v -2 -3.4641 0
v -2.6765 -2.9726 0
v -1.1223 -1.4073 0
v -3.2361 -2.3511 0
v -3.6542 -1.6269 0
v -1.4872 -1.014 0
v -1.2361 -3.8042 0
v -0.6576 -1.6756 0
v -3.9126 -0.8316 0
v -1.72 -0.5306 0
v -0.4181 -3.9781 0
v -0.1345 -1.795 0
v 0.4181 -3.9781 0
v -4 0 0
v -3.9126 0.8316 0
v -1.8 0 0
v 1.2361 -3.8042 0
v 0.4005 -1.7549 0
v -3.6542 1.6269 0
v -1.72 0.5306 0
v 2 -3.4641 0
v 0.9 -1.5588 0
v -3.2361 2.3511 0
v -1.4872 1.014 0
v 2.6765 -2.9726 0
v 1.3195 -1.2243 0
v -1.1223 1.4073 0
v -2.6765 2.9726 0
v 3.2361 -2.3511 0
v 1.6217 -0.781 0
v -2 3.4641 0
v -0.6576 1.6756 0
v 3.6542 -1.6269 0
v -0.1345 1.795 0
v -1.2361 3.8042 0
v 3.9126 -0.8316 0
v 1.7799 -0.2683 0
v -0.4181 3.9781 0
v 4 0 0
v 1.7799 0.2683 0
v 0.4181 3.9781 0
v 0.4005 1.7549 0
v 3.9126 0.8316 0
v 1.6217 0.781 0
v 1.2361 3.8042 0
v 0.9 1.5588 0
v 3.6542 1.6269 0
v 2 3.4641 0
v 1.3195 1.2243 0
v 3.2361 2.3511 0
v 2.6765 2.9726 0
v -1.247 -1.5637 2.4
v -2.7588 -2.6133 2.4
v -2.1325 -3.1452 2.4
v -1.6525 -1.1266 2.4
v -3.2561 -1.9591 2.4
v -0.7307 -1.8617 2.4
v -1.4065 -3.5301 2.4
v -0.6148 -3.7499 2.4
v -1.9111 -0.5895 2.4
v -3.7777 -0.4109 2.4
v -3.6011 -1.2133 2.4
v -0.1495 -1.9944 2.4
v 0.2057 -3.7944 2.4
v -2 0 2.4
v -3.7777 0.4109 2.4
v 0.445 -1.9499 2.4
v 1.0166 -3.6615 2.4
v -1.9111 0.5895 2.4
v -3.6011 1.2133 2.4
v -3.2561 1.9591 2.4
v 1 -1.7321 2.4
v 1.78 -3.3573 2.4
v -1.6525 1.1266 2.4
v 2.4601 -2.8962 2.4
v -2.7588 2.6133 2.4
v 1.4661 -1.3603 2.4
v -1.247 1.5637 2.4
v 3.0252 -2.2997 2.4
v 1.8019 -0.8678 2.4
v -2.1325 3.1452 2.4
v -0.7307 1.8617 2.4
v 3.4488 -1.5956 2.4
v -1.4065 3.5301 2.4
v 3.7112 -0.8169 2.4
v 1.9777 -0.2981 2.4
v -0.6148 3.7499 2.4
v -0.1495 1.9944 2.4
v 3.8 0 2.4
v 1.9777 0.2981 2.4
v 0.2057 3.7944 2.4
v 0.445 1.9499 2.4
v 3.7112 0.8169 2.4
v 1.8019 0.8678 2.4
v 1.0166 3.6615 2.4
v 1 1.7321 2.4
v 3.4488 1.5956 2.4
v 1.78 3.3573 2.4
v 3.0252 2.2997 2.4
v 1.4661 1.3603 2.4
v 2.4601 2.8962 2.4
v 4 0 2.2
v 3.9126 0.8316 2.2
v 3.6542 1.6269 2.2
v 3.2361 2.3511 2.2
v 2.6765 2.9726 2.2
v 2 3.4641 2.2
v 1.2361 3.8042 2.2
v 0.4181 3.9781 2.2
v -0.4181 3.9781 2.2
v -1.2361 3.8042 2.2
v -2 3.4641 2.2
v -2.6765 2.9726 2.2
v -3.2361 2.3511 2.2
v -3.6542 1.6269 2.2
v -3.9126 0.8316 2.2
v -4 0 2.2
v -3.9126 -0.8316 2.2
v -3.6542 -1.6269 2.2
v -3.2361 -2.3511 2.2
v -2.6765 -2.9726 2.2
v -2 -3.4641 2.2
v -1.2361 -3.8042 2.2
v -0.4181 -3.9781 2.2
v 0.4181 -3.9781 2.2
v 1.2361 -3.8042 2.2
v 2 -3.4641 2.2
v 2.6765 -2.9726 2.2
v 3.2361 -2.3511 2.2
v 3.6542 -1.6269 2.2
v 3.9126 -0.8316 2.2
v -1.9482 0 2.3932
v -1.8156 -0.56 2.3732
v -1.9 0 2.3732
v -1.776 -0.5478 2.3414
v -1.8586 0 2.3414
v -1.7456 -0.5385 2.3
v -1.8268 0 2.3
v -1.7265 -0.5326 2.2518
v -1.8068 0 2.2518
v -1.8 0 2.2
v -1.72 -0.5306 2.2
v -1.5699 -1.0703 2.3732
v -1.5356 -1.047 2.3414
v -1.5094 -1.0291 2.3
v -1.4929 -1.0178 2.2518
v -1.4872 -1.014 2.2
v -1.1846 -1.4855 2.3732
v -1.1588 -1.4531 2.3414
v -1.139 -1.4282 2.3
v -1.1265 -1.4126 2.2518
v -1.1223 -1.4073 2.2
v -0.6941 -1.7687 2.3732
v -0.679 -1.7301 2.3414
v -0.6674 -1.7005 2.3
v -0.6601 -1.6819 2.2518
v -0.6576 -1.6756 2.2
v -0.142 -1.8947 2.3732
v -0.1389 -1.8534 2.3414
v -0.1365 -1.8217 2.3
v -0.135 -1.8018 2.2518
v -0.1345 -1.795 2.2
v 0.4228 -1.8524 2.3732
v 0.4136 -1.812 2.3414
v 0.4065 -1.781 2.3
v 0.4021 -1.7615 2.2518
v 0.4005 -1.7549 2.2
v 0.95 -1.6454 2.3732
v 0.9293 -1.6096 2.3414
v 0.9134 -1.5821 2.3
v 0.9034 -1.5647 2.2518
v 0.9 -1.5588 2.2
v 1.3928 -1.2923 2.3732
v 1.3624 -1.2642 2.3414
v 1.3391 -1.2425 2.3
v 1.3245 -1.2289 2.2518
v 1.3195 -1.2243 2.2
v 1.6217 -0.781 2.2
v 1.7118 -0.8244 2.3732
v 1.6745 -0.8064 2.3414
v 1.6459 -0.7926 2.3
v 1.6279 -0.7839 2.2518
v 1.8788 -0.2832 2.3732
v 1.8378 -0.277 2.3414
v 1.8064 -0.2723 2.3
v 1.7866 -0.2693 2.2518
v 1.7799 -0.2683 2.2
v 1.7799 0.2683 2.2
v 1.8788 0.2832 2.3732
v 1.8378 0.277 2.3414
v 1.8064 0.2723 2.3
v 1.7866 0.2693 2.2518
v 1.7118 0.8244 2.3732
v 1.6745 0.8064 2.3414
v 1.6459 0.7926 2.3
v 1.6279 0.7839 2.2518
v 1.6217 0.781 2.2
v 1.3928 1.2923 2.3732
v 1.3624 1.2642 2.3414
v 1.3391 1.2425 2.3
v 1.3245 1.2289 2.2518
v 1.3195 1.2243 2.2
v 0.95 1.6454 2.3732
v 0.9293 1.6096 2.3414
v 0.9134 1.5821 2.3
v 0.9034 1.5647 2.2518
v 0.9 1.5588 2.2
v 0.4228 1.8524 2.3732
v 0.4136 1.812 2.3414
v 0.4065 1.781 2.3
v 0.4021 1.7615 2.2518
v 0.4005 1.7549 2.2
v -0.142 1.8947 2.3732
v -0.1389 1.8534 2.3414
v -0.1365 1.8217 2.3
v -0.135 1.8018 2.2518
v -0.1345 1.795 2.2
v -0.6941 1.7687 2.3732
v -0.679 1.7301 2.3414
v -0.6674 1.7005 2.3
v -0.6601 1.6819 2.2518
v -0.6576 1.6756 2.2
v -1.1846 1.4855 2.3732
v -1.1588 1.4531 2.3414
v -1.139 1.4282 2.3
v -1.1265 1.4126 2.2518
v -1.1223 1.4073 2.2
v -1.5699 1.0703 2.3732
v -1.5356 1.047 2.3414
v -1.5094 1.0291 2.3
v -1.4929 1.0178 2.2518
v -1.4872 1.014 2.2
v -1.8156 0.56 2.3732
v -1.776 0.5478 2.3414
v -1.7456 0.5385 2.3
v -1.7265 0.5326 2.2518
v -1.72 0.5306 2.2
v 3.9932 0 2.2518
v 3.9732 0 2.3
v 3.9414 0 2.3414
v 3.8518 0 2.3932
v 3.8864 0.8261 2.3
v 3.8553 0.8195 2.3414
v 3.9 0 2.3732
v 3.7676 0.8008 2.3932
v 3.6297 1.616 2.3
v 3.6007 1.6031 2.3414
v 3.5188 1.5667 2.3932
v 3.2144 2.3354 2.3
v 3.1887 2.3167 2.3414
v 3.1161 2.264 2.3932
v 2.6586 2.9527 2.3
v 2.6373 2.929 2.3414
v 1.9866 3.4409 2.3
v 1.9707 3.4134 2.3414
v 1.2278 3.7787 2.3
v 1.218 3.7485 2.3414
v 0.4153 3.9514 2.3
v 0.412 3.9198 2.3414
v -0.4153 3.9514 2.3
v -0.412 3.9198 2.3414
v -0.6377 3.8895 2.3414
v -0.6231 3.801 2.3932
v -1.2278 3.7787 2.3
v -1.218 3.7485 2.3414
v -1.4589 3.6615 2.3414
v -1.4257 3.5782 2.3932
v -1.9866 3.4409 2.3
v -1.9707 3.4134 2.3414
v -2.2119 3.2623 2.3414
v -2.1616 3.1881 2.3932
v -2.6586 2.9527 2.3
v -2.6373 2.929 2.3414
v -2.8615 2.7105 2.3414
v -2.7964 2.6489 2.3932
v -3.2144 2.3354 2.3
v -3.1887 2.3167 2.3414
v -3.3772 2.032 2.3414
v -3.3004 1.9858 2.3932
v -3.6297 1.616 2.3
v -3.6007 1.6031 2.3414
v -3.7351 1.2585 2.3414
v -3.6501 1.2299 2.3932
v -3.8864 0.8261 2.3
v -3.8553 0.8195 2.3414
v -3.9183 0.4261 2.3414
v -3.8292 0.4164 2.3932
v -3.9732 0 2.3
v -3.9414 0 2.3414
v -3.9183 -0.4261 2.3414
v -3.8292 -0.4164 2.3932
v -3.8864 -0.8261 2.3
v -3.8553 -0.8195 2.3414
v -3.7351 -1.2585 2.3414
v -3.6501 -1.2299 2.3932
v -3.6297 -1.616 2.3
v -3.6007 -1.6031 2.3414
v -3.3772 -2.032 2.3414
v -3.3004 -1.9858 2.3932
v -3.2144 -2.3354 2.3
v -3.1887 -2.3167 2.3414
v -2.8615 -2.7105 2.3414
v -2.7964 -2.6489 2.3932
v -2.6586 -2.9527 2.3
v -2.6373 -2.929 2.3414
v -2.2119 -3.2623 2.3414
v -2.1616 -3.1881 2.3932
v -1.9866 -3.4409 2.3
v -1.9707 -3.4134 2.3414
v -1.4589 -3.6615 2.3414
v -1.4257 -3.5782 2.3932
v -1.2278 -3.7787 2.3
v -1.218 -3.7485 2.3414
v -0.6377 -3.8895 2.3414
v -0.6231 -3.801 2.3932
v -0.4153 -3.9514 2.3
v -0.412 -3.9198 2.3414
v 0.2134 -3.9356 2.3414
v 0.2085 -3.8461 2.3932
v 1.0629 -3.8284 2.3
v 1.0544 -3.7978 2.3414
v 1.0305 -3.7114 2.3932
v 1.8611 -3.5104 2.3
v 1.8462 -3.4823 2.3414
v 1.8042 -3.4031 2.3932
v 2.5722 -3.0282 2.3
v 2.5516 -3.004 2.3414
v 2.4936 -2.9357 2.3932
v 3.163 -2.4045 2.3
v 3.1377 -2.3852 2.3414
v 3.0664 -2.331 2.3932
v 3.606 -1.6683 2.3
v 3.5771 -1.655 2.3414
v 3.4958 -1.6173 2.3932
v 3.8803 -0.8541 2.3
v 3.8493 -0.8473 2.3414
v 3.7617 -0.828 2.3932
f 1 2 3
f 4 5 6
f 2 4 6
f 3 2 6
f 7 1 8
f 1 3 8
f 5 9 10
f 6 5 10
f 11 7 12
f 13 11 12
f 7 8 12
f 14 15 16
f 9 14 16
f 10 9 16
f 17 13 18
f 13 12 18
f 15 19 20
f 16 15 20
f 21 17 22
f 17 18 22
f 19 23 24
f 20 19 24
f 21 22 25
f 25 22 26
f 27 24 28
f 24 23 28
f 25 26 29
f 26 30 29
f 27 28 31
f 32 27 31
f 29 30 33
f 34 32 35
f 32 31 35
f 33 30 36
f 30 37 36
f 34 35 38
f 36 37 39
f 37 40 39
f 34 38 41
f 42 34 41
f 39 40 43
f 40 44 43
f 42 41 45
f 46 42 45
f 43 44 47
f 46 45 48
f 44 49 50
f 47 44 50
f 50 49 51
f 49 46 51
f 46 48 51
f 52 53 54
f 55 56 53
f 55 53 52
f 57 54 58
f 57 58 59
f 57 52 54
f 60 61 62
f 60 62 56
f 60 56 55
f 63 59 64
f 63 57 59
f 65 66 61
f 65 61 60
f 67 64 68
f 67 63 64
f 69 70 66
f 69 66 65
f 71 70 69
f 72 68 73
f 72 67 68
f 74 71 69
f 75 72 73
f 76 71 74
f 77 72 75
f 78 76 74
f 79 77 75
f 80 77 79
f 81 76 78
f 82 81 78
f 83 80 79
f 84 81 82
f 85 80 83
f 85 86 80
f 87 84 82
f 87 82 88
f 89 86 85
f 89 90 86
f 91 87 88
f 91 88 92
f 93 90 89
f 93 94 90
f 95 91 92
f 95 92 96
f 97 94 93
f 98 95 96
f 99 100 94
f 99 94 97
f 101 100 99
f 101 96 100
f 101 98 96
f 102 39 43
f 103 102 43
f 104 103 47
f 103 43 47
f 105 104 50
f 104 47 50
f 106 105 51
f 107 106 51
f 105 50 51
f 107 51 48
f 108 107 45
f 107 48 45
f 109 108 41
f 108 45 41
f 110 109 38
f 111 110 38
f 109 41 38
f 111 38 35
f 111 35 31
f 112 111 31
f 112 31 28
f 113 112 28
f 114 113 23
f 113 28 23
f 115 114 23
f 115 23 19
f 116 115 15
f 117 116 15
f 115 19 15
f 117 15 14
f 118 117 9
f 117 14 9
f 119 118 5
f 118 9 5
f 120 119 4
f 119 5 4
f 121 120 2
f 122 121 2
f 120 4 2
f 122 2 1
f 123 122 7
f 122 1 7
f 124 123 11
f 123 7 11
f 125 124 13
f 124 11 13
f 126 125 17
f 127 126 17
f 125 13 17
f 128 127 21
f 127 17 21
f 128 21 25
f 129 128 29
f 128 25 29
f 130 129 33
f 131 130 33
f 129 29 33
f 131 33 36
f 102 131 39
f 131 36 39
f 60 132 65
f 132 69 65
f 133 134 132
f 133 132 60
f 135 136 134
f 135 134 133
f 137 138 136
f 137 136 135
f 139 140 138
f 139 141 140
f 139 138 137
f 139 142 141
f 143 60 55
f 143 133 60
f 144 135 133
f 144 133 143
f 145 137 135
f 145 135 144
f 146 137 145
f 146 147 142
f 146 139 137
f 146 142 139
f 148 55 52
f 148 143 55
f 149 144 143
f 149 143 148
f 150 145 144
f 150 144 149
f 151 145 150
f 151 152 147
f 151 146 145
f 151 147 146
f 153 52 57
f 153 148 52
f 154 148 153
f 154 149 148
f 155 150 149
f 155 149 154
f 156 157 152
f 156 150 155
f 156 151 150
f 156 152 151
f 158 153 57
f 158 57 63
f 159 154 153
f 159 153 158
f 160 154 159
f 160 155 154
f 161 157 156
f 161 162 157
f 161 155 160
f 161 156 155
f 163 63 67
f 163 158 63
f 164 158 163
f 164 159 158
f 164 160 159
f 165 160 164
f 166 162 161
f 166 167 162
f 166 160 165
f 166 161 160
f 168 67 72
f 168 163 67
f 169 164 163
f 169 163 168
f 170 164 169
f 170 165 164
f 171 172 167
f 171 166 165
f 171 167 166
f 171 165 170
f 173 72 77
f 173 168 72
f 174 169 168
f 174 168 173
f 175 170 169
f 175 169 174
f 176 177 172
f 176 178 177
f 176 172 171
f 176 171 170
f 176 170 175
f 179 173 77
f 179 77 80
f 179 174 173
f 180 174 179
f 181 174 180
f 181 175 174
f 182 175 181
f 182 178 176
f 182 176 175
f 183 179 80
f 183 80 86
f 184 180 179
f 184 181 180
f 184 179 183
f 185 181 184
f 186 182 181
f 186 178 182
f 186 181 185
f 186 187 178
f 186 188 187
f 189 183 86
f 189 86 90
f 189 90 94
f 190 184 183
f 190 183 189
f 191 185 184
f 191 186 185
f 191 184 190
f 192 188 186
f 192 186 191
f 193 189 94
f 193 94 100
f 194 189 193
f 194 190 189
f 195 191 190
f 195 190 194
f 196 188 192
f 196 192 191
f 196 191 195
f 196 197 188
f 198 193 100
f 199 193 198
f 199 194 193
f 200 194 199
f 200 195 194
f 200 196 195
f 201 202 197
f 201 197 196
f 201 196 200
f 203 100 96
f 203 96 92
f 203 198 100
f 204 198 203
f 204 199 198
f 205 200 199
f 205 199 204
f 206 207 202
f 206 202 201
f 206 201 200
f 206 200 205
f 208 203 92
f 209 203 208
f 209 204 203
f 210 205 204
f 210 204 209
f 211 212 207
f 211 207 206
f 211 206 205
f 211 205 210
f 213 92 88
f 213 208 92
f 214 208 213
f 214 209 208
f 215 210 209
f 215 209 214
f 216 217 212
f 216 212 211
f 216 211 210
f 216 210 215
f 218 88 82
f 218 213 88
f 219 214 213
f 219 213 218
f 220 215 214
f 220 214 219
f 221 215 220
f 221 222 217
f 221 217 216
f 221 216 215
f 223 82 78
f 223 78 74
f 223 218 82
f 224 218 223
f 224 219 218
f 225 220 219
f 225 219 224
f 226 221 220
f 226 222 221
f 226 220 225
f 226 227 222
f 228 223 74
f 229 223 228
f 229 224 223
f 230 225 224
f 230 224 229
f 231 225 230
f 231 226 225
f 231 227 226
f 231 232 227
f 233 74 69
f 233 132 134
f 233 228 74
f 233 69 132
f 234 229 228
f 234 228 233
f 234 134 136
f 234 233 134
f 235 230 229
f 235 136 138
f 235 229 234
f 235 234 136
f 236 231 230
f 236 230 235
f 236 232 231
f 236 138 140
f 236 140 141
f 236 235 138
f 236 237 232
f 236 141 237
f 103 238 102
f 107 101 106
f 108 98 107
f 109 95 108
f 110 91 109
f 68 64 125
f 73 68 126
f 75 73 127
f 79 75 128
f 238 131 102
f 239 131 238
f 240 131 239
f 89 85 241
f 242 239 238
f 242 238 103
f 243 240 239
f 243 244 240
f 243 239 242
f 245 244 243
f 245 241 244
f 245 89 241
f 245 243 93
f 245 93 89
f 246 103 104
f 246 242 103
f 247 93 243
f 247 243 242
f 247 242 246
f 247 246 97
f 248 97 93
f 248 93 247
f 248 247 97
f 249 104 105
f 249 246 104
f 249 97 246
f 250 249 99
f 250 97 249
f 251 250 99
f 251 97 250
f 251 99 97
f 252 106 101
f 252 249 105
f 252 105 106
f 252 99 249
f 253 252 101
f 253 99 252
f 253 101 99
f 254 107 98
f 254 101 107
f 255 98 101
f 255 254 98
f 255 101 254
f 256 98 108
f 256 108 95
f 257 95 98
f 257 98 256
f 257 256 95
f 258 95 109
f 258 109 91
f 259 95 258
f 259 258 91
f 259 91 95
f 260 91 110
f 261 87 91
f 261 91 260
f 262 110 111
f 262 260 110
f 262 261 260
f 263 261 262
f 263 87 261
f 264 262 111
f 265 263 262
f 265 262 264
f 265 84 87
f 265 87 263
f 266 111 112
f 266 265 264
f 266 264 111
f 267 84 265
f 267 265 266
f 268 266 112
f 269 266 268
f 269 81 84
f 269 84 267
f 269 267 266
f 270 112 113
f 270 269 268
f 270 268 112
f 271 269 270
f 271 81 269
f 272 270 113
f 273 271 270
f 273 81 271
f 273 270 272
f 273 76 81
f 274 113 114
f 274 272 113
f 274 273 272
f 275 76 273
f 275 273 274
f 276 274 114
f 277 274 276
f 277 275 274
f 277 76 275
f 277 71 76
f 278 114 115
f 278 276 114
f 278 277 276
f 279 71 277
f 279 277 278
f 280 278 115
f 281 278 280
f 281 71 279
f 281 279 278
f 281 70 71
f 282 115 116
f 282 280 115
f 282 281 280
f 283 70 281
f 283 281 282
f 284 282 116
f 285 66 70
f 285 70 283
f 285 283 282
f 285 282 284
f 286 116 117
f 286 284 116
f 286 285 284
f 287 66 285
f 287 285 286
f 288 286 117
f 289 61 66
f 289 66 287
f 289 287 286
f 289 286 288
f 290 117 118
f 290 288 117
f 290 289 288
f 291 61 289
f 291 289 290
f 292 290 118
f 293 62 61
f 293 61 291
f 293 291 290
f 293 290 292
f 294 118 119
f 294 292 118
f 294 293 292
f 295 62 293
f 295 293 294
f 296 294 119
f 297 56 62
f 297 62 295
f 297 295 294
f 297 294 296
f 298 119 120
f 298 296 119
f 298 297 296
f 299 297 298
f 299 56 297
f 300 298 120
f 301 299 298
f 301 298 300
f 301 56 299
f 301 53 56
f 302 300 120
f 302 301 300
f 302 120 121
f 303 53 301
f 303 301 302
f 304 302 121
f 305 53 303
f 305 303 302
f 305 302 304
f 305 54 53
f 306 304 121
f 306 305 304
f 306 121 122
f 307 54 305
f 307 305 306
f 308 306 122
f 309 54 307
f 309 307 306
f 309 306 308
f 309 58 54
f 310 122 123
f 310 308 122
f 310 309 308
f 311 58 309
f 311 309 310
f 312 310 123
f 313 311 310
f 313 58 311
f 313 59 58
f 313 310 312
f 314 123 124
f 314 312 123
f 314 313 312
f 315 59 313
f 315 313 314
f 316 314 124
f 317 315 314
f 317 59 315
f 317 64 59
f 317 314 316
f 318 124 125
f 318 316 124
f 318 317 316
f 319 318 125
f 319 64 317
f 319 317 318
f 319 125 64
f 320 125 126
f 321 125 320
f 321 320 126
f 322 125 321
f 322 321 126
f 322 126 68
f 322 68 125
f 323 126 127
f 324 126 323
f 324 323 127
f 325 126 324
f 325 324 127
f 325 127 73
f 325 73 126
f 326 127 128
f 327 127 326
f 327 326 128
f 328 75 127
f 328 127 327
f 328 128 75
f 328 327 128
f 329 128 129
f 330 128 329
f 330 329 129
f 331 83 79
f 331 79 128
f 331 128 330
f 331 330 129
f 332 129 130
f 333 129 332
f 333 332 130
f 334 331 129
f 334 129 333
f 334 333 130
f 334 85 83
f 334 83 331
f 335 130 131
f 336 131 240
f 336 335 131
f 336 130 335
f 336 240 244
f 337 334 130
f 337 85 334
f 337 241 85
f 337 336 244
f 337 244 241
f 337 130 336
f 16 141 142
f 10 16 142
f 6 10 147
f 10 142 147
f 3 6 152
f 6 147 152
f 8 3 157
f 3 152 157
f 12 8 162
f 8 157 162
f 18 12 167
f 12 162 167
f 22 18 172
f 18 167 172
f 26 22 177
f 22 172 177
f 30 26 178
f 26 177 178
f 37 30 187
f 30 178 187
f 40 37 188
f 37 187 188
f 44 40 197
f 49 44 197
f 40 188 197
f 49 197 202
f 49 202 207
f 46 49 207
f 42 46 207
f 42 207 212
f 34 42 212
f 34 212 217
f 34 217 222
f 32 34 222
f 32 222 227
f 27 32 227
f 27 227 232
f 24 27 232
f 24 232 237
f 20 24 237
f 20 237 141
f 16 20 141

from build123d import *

# Parameters (mm, degrees)
F0_R     = 4
F1_DEPTH = 2.4
F2_D     = 3.6
F3_R     = 0.2


with BuildPart() as f1:
    # F0 (on Top) → F1 (new body)
    with BuildSketch(Plane.XY):
        Circle(F0_R)
    extrude(amount=F1_DEPTH)

    # F2 (through all)
    with Locations(Plane(origin=(0, 0, 0), x_dir=(1, 0, 0), z_dir=(0, 0, -1))):
        with Locations((0, 0)):
            Hole(F2_D / 2)

    # F3
    f3_edges = [f1.edges().sort_by_distance(p)[0] for p in [
        (-4, 0, 2.4),
        (-1.8, 0, 2.4),
    ]]
    fillet(f3_edges, radius=F3_R)


solid = f1.part
